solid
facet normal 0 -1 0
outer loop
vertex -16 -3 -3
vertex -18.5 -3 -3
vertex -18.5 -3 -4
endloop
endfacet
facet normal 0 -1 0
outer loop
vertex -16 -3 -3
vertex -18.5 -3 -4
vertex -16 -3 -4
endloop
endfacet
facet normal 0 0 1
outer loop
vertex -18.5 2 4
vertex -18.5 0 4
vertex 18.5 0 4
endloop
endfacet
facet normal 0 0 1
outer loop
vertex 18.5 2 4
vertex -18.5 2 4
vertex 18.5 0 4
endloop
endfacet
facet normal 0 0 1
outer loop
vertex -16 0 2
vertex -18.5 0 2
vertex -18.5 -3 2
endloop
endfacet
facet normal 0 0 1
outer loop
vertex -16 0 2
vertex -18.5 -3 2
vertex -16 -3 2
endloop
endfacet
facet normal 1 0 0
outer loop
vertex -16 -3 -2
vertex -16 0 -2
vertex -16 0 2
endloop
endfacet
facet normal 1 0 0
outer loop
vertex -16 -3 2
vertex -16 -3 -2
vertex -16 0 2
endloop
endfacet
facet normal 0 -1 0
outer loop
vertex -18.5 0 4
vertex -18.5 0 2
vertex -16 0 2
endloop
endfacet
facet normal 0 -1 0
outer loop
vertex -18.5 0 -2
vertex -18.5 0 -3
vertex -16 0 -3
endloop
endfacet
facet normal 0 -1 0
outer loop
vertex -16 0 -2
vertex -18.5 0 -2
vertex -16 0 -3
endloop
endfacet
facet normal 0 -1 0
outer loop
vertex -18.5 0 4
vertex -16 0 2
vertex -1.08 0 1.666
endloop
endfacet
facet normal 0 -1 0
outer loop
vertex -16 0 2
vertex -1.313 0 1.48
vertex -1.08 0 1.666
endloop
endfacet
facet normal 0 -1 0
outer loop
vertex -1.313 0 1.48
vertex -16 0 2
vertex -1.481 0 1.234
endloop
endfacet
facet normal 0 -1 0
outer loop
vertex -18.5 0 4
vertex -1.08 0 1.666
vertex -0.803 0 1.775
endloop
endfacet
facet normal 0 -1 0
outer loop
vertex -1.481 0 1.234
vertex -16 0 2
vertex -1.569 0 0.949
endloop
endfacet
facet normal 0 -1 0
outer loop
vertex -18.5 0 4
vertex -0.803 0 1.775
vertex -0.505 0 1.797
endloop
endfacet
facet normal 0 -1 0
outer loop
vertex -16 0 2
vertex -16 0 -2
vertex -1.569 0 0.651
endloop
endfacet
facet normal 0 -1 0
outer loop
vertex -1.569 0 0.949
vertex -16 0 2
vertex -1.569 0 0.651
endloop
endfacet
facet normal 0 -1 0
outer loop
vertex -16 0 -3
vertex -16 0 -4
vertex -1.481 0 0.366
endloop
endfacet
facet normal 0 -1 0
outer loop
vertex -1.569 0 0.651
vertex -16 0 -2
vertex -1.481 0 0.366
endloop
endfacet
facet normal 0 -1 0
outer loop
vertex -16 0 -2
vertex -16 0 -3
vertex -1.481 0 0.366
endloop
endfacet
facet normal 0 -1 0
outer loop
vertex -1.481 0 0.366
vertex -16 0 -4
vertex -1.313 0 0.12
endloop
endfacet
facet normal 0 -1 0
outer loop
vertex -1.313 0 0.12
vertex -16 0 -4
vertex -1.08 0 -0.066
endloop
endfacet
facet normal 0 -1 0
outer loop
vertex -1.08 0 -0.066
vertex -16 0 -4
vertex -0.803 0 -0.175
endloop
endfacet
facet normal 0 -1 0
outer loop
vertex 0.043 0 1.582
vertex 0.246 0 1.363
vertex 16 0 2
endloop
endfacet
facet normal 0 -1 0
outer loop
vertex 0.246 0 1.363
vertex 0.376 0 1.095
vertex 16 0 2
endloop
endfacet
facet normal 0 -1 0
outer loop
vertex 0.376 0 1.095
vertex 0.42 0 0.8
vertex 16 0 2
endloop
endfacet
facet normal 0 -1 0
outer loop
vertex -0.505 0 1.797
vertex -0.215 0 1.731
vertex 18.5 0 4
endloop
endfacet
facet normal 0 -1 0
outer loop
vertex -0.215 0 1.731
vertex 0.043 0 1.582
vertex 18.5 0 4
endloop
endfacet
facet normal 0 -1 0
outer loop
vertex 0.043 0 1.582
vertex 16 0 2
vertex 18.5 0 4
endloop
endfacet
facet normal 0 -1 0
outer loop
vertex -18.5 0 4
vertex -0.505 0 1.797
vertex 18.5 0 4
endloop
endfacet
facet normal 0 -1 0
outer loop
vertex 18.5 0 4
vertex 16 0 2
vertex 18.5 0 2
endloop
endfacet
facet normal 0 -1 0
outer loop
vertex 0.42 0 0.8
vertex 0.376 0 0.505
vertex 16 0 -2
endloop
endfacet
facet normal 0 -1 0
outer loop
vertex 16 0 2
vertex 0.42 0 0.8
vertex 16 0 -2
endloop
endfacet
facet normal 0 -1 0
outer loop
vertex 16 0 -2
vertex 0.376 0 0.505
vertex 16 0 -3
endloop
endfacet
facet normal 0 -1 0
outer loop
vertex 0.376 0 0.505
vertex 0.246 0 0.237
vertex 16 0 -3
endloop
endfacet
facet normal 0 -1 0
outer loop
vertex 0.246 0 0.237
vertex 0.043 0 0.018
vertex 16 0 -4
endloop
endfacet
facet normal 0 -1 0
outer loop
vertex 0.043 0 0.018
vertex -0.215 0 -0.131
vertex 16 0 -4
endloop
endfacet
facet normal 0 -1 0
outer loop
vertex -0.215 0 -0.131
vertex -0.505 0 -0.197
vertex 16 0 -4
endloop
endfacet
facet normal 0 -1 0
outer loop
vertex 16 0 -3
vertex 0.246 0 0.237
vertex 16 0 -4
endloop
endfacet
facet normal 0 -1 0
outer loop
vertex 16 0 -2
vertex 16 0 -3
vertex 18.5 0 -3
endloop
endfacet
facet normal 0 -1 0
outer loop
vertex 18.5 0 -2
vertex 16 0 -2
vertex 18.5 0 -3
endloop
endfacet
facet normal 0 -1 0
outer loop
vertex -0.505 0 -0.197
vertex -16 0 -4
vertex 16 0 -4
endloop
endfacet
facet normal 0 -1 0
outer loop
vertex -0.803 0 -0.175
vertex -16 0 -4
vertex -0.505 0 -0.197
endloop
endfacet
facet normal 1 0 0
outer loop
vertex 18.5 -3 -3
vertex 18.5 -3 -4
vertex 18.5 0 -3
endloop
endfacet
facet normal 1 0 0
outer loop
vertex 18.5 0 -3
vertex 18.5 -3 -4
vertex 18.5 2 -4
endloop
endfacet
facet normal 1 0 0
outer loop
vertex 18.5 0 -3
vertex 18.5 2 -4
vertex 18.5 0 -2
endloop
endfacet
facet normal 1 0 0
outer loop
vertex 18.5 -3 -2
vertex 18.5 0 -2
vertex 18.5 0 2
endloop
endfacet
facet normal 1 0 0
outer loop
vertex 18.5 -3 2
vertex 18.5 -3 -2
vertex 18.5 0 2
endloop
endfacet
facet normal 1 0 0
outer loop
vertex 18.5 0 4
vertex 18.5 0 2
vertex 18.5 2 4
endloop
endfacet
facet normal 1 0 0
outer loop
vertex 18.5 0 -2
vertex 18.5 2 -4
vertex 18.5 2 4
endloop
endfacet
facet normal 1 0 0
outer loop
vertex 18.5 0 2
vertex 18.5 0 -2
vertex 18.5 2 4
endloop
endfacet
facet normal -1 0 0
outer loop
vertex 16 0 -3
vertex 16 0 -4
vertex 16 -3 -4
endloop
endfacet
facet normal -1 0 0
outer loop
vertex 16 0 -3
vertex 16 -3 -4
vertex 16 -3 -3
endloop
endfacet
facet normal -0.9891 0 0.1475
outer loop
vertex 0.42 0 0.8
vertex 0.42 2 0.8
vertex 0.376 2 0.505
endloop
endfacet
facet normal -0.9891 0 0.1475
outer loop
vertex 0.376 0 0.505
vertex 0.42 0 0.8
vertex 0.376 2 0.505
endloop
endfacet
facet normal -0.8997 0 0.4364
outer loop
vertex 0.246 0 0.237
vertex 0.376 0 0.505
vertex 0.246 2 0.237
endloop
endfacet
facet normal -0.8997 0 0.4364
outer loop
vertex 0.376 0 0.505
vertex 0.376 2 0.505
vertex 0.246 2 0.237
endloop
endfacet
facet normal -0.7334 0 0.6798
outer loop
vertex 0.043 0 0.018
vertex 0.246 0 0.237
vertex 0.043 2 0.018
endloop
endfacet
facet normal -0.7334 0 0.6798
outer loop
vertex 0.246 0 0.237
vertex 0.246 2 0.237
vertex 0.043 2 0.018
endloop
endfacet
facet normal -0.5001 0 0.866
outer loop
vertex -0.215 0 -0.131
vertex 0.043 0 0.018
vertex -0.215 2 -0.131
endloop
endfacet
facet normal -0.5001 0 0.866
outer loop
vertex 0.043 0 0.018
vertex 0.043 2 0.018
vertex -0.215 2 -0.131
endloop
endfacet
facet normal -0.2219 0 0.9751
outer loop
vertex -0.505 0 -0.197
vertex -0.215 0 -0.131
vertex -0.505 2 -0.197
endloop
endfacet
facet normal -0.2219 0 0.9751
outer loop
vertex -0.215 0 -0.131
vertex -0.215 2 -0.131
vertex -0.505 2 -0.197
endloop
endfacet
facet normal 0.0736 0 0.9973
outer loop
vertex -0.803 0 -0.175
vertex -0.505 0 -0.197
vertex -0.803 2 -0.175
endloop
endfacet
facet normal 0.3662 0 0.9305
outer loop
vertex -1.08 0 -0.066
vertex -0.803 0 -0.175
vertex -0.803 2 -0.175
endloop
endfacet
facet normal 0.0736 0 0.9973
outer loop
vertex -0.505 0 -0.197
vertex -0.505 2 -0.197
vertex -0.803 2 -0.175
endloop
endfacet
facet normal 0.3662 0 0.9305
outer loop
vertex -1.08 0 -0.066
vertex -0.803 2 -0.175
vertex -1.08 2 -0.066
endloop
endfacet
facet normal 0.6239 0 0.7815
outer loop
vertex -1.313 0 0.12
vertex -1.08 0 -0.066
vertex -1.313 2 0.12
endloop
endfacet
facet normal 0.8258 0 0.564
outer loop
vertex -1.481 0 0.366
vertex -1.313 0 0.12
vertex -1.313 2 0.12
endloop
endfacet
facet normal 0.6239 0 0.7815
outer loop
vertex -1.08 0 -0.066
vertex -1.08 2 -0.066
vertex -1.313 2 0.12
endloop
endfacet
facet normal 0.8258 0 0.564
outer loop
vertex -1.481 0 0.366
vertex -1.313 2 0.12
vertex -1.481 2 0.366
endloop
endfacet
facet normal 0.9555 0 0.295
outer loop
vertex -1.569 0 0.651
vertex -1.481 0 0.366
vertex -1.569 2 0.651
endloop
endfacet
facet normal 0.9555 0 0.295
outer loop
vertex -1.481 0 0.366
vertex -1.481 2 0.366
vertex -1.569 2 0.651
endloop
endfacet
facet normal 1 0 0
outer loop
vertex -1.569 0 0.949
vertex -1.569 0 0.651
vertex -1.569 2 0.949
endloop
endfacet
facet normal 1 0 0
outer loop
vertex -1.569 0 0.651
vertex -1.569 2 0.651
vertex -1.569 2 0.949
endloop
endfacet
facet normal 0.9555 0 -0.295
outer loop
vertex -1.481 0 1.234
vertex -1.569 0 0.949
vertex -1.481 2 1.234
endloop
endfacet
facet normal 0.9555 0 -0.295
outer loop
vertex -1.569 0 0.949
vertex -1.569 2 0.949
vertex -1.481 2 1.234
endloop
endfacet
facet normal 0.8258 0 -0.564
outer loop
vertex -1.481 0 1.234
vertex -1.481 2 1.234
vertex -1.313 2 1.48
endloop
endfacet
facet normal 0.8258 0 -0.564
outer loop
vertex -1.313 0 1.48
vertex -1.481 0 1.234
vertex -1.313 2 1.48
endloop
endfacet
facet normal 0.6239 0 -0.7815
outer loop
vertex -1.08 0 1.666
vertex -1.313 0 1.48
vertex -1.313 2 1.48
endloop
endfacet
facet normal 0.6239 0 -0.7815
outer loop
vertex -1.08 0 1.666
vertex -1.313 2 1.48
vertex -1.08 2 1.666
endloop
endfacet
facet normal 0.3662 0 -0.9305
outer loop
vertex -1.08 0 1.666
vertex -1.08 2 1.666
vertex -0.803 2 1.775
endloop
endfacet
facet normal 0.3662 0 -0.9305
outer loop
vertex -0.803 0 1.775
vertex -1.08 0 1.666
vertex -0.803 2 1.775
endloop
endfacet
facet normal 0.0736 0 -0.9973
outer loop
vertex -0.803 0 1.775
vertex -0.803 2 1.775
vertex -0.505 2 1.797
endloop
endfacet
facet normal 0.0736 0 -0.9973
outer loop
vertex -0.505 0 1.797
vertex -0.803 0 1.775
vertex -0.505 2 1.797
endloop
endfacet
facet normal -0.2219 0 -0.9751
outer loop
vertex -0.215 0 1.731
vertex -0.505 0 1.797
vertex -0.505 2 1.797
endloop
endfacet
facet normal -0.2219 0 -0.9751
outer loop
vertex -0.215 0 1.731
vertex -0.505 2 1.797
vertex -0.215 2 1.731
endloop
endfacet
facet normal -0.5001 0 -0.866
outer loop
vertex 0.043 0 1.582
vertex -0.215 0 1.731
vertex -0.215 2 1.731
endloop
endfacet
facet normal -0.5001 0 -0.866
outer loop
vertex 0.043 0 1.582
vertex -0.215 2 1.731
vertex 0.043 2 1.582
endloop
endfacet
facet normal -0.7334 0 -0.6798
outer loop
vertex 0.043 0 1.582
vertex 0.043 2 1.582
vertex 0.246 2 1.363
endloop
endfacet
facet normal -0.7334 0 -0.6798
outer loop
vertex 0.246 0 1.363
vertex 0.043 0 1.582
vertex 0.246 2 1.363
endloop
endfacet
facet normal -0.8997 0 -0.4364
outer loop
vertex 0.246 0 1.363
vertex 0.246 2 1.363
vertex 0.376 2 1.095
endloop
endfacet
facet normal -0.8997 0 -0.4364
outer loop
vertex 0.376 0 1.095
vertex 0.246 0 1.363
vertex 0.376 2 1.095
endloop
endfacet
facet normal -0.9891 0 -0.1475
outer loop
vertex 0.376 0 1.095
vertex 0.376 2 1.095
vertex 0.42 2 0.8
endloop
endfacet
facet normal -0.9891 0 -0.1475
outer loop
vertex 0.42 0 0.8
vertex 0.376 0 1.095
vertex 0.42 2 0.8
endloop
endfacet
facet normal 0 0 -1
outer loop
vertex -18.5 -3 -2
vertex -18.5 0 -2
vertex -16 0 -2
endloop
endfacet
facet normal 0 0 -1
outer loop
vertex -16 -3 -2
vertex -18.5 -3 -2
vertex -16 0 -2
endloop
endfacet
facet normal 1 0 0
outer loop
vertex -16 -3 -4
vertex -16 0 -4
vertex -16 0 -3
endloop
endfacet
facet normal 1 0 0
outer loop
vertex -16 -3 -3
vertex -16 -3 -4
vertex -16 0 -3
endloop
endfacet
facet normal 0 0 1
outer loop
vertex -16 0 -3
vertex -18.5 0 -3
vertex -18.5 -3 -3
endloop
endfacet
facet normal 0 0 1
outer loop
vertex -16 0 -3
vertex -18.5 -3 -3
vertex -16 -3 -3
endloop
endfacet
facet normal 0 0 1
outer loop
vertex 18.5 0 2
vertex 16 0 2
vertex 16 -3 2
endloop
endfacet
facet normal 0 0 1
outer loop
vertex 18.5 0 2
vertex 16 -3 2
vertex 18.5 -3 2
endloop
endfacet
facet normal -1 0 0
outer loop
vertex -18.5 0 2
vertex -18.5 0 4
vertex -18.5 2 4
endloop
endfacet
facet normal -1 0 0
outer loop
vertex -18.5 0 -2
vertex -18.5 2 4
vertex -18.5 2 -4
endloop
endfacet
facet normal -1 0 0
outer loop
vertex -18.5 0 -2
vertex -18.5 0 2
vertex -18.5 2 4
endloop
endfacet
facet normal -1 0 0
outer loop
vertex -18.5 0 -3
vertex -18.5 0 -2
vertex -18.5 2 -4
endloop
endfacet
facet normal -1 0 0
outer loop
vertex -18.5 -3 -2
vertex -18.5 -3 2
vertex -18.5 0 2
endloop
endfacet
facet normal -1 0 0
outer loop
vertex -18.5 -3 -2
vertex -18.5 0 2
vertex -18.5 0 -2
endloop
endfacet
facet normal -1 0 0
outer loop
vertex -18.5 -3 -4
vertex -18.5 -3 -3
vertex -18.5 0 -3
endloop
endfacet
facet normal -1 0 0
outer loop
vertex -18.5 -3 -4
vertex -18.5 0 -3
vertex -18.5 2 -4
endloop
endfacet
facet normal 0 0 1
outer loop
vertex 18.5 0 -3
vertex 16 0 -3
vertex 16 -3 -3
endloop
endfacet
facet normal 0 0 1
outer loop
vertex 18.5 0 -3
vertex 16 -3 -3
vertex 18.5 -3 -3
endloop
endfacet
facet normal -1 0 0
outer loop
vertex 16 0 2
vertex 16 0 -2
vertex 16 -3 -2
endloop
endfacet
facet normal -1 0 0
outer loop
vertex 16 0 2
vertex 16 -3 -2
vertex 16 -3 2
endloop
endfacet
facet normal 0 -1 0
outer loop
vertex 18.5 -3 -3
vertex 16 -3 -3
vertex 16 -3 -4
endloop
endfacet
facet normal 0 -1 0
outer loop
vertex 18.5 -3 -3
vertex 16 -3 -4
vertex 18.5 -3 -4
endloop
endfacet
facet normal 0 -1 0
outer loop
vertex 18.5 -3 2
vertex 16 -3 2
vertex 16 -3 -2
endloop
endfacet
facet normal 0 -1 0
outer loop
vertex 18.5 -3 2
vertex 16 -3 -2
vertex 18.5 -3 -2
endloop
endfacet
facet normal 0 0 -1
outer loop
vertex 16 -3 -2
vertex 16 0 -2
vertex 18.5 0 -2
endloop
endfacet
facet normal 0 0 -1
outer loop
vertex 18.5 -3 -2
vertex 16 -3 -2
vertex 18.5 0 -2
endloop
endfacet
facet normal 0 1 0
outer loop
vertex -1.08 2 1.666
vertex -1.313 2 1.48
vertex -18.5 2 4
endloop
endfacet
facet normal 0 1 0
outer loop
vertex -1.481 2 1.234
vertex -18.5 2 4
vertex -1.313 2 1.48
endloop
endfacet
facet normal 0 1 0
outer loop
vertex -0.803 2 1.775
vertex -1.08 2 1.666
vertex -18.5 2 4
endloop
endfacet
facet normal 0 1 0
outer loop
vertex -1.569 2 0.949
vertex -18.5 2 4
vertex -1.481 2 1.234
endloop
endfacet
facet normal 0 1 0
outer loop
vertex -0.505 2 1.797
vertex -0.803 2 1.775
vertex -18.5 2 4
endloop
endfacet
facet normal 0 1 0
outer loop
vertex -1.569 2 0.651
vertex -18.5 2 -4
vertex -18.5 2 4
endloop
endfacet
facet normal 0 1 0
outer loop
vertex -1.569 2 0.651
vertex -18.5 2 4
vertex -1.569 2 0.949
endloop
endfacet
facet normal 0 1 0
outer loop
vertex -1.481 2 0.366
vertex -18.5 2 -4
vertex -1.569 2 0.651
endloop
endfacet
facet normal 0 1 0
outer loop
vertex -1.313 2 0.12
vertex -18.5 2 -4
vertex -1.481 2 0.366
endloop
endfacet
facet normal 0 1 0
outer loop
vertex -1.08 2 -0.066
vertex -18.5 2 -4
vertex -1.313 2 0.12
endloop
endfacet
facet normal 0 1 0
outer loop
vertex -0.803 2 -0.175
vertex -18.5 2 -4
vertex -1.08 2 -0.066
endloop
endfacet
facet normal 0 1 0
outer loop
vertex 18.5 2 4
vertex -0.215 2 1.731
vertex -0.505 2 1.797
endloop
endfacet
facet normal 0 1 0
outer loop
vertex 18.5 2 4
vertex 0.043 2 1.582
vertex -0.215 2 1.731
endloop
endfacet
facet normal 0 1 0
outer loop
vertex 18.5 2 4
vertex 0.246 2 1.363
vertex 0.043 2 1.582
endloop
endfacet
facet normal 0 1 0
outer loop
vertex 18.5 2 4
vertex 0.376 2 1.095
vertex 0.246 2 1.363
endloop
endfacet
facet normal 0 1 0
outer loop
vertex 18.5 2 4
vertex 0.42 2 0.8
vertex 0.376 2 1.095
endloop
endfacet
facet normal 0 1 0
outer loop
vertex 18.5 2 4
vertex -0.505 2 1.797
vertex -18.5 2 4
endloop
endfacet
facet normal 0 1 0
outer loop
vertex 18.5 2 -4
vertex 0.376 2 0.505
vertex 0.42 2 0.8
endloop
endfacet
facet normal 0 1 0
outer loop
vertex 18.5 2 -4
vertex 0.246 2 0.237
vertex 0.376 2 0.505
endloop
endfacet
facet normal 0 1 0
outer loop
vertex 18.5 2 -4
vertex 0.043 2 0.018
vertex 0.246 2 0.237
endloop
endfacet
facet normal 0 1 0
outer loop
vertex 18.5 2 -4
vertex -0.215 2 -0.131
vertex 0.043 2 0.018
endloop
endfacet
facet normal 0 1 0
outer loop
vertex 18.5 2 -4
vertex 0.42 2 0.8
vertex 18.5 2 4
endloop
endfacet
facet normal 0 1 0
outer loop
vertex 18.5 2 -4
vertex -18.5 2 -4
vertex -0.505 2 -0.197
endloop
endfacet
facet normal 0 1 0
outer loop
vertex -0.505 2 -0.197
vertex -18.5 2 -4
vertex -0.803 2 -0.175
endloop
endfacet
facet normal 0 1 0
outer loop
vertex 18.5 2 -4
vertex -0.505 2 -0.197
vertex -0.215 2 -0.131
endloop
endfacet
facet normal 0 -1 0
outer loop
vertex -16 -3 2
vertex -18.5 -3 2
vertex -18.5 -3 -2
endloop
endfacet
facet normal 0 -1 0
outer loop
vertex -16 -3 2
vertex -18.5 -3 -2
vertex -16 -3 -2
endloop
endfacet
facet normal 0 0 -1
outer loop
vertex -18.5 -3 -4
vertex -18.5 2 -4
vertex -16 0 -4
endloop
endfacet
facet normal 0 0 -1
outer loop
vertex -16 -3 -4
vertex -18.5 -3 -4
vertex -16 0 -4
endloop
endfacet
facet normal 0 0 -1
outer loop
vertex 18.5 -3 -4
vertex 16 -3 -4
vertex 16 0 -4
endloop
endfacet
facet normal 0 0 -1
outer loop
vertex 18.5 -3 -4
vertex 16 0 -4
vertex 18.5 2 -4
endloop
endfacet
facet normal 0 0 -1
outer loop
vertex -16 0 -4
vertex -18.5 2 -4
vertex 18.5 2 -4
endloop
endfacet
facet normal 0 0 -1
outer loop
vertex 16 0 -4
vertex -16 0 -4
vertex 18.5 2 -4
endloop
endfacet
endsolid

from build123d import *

# Parameters (mm, degrees)
SKETCH1_W           = 37
SKETCH1_H           = 8
BOSS_EXTRUDE1_DEPTH = 2
SKETCH2_R           = 1
CUT_EXTRUDE1_DEPTH  = 3
SKETCH3_W           = 2.5
SKETCH3_H           = 4
SKETCH3_H_2         = 1
BOSS_EXTRUDE2_DEPTH = 3


with BuildPart() as part:
    # Sketch1 → Boss-Extrude1 (new body)
    with BuildSketch(Plane(origin=(0, 0, 0), x_dir=(1, 0, 0), z_dir=(0, 1, 0))):
        Rectangle(SKETCH1_W, SKETCH1_H)
    extrude(amount=BOSS_EXTRUDE1_DEPTH)

    # Sketch2 → Cut-Extrude1 (cut, through all)
    with BuildSketch(Plane(origin=(0, 2, 0), x_dir=(1, 0, 0), z_dir=(0, 1, 0))):
        with Locations((-0.58, -0.8)):
            Circle(SKETCH2_R)
    extrude(amount=-CUT_EXTRUDE1_DEPTH, mode=Mode.SUBTRACT)

    # Sketch3 → Boss-Extrude2 (add)
    with BuildSketch(Plane.XZ):
        with Locations((17.25, 0)):
            Rectangle(SKETCH3_W, SKETCH3_H)
        with Locations((17.25, -3.5)):
            Rectangle(SKETCH3_W, SKETCH3_H_2)
        with Locations((-17.25, -3.5)):
            Rectangle(SKETCH3_W, SKETCH3_H_2)
        with Locations((-17.25, 0)):
            Rectangle(SKETCH3_W, SKETCH3_H)
    extrude(amount=BOSS_EXTRUDE2_DEPTH)


solid = part.part
